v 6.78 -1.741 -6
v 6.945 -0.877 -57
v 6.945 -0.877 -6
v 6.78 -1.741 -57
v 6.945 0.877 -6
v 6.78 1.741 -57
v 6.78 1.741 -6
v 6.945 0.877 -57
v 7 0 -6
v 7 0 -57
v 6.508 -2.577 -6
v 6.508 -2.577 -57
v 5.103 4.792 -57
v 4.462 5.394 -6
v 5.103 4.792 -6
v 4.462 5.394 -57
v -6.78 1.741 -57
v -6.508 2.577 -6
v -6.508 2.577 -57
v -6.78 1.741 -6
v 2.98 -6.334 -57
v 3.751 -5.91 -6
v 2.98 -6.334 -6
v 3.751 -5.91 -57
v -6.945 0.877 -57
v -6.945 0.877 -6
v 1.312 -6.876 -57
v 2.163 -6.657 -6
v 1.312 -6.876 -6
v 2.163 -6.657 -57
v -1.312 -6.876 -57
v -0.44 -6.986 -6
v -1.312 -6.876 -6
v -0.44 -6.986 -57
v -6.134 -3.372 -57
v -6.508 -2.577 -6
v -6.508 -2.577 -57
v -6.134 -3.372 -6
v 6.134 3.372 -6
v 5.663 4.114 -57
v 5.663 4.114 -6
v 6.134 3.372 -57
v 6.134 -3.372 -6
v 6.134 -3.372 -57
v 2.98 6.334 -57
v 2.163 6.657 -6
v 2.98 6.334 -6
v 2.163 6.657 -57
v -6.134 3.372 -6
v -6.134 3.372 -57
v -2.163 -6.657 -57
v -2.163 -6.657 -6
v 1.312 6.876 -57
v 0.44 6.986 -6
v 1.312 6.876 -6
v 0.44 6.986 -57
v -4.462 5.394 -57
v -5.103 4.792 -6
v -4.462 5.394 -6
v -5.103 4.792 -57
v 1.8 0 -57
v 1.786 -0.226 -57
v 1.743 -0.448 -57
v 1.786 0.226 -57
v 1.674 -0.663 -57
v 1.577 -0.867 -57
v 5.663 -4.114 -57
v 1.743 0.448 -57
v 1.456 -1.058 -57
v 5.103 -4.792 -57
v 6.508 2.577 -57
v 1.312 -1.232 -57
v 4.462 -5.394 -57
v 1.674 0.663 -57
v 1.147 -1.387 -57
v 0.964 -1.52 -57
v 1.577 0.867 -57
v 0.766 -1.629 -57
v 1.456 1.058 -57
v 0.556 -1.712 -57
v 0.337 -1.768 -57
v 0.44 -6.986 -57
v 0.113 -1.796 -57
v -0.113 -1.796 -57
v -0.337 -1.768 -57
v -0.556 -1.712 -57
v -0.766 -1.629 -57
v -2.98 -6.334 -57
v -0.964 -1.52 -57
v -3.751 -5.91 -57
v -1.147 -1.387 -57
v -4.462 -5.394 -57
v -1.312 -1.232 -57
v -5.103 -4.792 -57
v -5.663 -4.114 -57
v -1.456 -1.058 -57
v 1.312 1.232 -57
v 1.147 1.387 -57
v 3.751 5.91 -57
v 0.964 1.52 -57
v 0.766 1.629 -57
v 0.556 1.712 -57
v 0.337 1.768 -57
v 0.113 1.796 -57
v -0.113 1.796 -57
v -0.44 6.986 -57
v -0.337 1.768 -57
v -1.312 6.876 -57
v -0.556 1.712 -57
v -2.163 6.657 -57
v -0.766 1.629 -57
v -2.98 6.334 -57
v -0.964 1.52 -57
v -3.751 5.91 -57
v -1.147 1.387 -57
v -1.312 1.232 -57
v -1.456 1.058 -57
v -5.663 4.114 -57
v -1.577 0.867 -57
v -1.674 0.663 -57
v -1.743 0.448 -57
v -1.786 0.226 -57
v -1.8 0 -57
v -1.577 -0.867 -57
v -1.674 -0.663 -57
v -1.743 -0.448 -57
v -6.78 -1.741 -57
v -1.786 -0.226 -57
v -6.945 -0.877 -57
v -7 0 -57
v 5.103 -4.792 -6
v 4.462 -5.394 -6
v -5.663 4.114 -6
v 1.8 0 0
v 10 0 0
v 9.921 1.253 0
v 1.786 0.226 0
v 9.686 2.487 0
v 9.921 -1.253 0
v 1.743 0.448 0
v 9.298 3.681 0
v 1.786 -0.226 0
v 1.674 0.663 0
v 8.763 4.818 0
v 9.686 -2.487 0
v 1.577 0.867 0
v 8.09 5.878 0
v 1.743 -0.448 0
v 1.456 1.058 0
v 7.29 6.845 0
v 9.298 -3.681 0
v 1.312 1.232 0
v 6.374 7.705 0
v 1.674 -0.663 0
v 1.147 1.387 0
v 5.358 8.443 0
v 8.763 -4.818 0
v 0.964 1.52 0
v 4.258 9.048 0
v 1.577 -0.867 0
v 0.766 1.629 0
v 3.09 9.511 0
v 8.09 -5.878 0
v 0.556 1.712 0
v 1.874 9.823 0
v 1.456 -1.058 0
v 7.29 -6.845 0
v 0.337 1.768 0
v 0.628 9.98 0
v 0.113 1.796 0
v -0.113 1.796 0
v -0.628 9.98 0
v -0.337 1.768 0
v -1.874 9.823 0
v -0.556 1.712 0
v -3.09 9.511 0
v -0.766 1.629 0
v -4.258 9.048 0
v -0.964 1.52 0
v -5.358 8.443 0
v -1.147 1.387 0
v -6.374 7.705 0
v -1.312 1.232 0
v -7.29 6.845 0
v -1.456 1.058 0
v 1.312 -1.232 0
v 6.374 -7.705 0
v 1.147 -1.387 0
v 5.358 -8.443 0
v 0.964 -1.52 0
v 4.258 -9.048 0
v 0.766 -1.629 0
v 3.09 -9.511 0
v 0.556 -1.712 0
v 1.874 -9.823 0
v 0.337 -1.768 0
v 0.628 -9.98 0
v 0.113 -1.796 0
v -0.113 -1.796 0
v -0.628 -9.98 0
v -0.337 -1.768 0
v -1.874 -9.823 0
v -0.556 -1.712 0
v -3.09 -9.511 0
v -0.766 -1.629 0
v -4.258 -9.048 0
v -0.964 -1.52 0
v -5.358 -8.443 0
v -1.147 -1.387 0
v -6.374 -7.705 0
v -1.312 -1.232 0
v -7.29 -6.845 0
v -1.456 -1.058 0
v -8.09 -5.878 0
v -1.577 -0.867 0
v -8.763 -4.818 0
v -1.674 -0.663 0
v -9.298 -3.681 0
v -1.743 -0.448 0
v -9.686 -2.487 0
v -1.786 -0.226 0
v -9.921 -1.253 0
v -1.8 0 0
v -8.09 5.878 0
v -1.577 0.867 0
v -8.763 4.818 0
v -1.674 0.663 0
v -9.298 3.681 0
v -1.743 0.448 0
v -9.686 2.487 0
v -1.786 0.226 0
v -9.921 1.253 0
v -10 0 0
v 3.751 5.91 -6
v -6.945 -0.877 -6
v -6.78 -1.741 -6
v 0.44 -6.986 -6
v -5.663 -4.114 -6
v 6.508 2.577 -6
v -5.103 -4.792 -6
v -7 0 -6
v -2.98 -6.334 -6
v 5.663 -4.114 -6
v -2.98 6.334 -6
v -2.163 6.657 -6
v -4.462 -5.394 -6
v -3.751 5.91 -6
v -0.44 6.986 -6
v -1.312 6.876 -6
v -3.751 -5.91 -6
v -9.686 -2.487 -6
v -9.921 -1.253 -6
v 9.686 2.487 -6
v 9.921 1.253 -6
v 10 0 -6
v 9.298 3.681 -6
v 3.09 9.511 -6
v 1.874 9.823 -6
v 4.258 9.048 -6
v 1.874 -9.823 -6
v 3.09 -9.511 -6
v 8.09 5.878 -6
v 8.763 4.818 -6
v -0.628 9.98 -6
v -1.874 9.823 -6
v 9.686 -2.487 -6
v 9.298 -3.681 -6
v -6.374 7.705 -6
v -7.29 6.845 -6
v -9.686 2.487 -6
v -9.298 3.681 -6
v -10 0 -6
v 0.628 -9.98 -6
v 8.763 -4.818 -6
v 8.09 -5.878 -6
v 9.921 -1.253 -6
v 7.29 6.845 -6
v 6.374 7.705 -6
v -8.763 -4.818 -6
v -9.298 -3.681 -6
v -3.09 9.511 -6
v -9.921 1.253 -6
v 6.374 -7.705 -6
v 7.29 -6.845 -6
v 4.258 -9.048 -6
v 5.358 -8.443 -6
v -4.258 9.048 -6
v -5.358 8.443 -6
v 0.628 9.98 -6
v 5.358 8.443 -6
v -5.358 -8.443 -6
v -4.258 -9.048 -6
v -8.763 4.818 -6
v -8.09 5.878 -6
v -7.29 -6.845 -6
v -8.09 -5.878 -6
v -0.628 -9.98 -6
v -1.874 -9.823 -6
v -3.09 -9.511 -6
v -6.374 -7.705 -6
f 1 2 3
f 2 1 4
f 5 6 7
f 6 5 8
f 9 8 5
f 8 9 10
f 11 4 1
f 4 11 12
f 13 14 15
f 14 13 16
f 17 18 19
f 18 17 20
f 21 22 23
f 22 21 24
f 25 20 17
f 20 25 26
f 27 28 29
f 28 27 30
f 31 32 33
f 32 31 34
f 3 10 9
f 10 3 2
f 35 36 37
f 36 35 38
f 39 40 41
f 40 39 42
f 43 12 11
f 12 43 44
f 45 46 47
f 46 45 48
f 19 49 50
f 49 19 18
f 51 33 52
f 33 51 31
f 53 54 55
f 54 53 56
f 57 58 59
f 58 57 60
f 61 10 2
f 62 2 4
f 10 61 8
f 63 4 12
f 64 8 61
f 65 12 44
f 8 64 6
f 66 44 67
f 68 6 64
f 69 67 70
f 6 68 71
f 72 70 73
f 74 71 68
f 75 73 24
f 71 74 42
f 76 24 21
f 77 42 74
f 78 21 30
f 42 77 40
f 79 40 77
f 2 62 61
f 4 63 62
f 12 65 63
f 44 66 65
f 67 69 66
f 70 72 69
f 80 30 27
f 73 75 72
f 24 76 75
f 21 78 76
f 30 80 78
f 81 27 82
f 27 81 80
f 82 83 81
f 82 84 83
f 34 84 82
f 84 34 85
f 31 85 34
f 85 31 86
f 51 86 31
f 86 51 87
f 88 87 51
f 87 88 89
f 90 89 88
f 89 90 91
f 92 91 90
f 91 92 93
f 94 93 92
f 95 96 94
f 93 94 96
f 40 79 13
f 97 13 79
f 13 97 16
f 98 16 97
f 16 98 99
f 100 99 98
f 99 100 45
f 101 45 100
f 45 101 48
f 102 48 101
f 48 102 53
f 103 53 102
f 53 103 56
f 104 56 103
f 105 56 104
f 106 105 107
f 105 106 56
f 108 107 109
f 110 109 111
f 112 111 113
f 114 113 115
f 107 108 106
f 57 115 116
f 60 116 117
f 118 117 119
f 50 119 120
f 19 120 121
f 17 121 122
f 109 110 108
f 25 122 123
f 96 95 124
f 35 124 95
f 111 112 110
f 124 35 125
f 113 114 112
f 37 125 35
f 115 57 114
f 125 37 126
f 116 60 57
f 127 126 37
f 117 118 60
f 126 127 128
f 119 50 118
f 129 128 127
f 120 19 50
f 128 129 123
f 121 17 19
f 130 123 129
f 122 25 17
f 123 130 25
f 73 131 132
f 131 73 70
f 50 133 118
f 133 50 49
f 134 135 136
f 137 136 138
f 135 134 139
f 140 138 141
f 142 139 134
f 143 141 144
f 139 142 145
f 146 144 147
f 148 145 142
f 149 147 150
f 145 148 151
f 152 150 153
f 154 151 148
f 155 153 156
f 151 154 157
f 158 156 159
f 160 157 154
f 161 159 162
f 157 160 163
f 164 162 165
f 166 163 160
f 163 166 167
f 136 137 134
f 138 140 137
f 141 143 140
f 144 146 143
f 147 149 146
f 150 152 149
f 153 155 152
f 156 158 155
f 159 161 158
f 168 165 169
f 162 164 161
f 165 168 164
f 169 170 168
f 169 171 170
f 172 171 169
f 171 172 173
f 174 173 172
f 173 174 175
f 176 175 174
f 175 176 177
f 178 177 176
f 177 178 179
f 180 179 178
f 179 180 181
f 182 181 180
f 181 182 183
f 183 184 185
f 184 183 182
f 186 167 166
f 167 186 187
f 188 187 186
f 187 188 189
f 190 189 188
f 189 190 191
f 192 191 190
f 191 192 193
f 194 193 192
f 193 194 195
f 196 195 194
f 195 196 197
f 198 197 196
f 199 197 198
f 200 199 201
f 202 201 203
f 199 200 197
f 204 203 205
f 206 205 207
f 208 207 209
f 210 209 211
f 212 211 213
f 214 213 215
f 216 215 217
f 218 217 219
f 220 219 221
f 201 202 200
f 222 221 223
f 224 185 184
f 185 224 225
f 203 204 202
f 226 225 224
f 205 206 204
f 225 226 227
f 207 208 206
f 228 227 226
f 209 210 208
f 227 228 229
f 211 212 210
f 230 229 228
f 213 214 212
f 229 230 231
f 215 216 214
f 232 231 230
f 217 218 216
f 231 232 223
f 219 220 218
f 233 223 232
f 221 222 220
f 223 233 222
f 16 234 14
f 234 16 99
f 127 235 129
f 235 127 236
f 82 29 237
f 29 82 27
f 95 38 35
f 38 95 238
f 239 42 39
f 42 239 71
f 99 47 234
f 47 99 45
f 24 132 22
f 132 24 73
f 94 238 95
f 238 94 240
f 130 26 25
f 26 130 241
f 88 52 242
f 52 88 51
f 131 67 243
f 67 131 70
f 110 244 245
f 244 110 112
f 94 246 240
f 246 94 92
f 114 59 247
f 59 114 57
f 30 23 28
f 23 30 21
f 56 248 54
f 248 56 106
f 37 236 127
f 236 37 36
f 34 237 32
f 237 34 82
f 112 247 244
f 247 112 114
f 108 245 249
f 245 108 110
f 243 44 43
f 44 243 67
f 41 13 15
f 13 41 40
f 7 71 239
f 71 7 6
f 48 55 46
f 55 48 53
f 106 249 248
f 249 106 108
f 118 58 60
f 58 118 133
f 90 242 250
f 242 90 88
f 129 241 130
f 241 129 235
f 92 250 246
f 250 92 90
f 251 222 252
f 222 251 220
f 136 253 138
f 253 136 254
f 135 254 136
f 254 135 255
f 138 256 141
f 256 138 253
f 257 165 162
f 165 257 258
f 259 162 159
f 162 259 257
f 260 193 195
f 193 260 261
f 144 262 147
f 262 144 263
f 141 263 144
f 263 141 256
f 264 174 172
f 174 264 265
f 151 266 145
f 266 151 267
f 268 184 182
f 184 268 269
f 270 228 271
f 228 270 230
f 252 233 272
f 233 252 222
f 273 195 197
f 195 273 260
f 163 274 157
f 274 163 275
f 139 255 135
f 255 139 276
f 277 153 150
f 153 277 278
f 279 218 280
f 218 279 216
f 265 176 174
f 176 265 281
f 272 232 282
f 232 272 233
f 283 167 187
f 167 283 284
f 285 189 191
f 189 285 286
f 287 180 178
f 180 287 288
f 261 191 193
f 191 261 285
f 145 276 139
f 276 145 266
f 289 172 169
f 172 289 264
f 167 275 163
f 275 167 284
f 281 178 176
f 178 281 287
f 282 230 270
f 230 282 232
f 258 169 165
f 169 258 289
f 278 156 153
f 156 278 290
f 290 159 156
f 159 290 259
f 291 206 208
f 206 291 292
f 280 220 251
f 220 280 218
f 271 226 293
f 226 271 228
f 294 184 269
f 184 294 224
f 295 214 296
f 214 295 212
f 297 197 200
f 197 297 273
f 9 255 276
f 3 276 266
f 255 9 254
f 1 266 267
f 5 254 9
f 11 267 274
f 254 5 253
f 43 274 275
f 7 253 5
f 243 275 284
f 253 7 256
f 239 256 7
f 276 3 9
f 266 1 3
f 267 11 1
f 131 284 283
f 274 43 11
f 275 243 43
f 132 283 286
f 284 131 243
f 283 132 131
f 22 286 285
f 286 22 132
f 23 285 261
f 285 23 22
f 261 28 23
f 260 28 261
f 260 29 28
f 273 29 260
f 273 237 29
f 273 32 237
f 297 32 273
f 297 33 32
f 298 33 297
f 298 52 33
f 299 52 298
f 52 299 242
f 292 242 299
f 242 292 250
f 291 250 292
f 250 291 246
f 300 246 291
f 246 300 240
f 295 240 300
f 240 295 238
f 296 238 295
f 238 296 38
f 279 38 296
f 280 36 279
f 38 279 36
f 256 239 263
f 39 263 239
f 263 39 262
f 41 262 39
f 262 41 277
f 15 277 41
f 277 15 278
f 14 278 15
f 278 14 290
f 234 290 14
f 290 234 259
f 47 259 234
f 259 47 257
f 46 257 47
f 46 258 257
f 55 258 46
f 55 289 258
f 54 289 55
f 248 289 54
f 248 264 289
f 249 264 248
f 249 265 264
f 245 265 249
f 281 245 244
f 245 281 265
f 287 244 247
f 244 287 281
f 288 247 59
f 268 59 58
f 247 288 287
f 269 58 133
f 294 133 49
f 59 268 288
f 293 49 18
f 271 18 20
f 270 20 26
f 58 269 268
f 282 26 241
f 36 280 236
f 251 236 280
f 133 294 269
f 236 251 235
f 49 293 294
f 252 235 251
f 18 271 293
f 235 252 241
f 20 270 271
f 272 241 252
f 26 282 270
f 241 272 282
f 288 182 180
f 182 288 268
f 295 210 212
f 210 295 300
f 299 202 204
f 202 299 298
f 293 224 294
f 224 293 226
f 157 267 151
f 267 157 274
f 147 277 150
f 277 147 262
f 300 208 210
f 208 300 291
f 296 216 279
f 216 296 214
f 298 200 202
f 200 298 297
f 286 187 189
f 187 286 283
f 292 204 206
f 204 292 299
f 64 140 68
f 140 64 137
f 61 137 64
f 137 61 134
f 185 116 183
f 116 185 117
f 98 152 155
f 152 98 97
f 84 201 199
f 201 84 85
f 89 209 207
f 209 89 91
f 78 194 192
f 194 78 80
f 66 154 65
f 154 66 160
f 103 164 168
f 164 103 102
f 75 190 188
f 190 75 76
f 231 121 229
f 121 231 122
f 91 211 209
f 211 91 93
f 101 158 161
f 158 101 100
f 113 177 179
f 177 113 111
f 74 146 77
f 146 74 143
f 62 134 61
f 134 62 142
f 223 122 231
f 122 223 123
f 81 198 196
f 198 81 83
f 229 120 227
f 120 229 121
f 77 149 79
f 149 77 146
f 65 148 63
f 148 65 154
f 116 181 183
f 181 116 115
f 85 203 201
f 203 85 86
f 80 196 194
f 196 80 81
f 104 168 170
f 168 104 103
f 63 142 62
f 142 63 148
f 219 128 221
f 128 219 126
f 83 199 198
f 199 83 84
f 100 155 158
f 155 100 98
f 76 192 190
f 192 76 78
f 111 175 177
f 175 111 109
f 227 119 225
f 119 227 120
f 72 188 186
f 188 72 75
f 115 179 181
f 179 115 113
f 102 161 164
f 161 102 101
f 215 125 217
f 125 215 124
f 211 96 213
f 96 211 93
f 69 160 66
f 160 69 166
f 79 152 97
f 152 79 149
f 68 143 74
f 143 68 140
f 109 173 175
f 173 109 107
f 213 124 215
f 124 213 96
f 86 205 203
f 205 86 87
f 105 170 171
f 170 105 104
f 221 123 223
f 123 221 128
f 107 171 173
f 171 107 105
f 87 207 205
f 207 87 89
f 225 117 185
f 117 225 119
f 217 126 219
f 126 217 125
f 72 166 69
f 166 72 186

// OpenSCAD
$fn = 50;


difference() {
	union() {
		translate(v = [0, 0, -57.0000000000]) {
			cylinder(h = 57, r = 7.0000000000);
		}
		translate(v = [0, 0, -6.0000000000]) {
			cylinder(h = 6, r = 10.0000000000);
		}
	}
	union() {
		#translate(v = [0, 0, -57]) {
			cylinder(h = 57, r = 1.8000000000);
		}
	}
}
